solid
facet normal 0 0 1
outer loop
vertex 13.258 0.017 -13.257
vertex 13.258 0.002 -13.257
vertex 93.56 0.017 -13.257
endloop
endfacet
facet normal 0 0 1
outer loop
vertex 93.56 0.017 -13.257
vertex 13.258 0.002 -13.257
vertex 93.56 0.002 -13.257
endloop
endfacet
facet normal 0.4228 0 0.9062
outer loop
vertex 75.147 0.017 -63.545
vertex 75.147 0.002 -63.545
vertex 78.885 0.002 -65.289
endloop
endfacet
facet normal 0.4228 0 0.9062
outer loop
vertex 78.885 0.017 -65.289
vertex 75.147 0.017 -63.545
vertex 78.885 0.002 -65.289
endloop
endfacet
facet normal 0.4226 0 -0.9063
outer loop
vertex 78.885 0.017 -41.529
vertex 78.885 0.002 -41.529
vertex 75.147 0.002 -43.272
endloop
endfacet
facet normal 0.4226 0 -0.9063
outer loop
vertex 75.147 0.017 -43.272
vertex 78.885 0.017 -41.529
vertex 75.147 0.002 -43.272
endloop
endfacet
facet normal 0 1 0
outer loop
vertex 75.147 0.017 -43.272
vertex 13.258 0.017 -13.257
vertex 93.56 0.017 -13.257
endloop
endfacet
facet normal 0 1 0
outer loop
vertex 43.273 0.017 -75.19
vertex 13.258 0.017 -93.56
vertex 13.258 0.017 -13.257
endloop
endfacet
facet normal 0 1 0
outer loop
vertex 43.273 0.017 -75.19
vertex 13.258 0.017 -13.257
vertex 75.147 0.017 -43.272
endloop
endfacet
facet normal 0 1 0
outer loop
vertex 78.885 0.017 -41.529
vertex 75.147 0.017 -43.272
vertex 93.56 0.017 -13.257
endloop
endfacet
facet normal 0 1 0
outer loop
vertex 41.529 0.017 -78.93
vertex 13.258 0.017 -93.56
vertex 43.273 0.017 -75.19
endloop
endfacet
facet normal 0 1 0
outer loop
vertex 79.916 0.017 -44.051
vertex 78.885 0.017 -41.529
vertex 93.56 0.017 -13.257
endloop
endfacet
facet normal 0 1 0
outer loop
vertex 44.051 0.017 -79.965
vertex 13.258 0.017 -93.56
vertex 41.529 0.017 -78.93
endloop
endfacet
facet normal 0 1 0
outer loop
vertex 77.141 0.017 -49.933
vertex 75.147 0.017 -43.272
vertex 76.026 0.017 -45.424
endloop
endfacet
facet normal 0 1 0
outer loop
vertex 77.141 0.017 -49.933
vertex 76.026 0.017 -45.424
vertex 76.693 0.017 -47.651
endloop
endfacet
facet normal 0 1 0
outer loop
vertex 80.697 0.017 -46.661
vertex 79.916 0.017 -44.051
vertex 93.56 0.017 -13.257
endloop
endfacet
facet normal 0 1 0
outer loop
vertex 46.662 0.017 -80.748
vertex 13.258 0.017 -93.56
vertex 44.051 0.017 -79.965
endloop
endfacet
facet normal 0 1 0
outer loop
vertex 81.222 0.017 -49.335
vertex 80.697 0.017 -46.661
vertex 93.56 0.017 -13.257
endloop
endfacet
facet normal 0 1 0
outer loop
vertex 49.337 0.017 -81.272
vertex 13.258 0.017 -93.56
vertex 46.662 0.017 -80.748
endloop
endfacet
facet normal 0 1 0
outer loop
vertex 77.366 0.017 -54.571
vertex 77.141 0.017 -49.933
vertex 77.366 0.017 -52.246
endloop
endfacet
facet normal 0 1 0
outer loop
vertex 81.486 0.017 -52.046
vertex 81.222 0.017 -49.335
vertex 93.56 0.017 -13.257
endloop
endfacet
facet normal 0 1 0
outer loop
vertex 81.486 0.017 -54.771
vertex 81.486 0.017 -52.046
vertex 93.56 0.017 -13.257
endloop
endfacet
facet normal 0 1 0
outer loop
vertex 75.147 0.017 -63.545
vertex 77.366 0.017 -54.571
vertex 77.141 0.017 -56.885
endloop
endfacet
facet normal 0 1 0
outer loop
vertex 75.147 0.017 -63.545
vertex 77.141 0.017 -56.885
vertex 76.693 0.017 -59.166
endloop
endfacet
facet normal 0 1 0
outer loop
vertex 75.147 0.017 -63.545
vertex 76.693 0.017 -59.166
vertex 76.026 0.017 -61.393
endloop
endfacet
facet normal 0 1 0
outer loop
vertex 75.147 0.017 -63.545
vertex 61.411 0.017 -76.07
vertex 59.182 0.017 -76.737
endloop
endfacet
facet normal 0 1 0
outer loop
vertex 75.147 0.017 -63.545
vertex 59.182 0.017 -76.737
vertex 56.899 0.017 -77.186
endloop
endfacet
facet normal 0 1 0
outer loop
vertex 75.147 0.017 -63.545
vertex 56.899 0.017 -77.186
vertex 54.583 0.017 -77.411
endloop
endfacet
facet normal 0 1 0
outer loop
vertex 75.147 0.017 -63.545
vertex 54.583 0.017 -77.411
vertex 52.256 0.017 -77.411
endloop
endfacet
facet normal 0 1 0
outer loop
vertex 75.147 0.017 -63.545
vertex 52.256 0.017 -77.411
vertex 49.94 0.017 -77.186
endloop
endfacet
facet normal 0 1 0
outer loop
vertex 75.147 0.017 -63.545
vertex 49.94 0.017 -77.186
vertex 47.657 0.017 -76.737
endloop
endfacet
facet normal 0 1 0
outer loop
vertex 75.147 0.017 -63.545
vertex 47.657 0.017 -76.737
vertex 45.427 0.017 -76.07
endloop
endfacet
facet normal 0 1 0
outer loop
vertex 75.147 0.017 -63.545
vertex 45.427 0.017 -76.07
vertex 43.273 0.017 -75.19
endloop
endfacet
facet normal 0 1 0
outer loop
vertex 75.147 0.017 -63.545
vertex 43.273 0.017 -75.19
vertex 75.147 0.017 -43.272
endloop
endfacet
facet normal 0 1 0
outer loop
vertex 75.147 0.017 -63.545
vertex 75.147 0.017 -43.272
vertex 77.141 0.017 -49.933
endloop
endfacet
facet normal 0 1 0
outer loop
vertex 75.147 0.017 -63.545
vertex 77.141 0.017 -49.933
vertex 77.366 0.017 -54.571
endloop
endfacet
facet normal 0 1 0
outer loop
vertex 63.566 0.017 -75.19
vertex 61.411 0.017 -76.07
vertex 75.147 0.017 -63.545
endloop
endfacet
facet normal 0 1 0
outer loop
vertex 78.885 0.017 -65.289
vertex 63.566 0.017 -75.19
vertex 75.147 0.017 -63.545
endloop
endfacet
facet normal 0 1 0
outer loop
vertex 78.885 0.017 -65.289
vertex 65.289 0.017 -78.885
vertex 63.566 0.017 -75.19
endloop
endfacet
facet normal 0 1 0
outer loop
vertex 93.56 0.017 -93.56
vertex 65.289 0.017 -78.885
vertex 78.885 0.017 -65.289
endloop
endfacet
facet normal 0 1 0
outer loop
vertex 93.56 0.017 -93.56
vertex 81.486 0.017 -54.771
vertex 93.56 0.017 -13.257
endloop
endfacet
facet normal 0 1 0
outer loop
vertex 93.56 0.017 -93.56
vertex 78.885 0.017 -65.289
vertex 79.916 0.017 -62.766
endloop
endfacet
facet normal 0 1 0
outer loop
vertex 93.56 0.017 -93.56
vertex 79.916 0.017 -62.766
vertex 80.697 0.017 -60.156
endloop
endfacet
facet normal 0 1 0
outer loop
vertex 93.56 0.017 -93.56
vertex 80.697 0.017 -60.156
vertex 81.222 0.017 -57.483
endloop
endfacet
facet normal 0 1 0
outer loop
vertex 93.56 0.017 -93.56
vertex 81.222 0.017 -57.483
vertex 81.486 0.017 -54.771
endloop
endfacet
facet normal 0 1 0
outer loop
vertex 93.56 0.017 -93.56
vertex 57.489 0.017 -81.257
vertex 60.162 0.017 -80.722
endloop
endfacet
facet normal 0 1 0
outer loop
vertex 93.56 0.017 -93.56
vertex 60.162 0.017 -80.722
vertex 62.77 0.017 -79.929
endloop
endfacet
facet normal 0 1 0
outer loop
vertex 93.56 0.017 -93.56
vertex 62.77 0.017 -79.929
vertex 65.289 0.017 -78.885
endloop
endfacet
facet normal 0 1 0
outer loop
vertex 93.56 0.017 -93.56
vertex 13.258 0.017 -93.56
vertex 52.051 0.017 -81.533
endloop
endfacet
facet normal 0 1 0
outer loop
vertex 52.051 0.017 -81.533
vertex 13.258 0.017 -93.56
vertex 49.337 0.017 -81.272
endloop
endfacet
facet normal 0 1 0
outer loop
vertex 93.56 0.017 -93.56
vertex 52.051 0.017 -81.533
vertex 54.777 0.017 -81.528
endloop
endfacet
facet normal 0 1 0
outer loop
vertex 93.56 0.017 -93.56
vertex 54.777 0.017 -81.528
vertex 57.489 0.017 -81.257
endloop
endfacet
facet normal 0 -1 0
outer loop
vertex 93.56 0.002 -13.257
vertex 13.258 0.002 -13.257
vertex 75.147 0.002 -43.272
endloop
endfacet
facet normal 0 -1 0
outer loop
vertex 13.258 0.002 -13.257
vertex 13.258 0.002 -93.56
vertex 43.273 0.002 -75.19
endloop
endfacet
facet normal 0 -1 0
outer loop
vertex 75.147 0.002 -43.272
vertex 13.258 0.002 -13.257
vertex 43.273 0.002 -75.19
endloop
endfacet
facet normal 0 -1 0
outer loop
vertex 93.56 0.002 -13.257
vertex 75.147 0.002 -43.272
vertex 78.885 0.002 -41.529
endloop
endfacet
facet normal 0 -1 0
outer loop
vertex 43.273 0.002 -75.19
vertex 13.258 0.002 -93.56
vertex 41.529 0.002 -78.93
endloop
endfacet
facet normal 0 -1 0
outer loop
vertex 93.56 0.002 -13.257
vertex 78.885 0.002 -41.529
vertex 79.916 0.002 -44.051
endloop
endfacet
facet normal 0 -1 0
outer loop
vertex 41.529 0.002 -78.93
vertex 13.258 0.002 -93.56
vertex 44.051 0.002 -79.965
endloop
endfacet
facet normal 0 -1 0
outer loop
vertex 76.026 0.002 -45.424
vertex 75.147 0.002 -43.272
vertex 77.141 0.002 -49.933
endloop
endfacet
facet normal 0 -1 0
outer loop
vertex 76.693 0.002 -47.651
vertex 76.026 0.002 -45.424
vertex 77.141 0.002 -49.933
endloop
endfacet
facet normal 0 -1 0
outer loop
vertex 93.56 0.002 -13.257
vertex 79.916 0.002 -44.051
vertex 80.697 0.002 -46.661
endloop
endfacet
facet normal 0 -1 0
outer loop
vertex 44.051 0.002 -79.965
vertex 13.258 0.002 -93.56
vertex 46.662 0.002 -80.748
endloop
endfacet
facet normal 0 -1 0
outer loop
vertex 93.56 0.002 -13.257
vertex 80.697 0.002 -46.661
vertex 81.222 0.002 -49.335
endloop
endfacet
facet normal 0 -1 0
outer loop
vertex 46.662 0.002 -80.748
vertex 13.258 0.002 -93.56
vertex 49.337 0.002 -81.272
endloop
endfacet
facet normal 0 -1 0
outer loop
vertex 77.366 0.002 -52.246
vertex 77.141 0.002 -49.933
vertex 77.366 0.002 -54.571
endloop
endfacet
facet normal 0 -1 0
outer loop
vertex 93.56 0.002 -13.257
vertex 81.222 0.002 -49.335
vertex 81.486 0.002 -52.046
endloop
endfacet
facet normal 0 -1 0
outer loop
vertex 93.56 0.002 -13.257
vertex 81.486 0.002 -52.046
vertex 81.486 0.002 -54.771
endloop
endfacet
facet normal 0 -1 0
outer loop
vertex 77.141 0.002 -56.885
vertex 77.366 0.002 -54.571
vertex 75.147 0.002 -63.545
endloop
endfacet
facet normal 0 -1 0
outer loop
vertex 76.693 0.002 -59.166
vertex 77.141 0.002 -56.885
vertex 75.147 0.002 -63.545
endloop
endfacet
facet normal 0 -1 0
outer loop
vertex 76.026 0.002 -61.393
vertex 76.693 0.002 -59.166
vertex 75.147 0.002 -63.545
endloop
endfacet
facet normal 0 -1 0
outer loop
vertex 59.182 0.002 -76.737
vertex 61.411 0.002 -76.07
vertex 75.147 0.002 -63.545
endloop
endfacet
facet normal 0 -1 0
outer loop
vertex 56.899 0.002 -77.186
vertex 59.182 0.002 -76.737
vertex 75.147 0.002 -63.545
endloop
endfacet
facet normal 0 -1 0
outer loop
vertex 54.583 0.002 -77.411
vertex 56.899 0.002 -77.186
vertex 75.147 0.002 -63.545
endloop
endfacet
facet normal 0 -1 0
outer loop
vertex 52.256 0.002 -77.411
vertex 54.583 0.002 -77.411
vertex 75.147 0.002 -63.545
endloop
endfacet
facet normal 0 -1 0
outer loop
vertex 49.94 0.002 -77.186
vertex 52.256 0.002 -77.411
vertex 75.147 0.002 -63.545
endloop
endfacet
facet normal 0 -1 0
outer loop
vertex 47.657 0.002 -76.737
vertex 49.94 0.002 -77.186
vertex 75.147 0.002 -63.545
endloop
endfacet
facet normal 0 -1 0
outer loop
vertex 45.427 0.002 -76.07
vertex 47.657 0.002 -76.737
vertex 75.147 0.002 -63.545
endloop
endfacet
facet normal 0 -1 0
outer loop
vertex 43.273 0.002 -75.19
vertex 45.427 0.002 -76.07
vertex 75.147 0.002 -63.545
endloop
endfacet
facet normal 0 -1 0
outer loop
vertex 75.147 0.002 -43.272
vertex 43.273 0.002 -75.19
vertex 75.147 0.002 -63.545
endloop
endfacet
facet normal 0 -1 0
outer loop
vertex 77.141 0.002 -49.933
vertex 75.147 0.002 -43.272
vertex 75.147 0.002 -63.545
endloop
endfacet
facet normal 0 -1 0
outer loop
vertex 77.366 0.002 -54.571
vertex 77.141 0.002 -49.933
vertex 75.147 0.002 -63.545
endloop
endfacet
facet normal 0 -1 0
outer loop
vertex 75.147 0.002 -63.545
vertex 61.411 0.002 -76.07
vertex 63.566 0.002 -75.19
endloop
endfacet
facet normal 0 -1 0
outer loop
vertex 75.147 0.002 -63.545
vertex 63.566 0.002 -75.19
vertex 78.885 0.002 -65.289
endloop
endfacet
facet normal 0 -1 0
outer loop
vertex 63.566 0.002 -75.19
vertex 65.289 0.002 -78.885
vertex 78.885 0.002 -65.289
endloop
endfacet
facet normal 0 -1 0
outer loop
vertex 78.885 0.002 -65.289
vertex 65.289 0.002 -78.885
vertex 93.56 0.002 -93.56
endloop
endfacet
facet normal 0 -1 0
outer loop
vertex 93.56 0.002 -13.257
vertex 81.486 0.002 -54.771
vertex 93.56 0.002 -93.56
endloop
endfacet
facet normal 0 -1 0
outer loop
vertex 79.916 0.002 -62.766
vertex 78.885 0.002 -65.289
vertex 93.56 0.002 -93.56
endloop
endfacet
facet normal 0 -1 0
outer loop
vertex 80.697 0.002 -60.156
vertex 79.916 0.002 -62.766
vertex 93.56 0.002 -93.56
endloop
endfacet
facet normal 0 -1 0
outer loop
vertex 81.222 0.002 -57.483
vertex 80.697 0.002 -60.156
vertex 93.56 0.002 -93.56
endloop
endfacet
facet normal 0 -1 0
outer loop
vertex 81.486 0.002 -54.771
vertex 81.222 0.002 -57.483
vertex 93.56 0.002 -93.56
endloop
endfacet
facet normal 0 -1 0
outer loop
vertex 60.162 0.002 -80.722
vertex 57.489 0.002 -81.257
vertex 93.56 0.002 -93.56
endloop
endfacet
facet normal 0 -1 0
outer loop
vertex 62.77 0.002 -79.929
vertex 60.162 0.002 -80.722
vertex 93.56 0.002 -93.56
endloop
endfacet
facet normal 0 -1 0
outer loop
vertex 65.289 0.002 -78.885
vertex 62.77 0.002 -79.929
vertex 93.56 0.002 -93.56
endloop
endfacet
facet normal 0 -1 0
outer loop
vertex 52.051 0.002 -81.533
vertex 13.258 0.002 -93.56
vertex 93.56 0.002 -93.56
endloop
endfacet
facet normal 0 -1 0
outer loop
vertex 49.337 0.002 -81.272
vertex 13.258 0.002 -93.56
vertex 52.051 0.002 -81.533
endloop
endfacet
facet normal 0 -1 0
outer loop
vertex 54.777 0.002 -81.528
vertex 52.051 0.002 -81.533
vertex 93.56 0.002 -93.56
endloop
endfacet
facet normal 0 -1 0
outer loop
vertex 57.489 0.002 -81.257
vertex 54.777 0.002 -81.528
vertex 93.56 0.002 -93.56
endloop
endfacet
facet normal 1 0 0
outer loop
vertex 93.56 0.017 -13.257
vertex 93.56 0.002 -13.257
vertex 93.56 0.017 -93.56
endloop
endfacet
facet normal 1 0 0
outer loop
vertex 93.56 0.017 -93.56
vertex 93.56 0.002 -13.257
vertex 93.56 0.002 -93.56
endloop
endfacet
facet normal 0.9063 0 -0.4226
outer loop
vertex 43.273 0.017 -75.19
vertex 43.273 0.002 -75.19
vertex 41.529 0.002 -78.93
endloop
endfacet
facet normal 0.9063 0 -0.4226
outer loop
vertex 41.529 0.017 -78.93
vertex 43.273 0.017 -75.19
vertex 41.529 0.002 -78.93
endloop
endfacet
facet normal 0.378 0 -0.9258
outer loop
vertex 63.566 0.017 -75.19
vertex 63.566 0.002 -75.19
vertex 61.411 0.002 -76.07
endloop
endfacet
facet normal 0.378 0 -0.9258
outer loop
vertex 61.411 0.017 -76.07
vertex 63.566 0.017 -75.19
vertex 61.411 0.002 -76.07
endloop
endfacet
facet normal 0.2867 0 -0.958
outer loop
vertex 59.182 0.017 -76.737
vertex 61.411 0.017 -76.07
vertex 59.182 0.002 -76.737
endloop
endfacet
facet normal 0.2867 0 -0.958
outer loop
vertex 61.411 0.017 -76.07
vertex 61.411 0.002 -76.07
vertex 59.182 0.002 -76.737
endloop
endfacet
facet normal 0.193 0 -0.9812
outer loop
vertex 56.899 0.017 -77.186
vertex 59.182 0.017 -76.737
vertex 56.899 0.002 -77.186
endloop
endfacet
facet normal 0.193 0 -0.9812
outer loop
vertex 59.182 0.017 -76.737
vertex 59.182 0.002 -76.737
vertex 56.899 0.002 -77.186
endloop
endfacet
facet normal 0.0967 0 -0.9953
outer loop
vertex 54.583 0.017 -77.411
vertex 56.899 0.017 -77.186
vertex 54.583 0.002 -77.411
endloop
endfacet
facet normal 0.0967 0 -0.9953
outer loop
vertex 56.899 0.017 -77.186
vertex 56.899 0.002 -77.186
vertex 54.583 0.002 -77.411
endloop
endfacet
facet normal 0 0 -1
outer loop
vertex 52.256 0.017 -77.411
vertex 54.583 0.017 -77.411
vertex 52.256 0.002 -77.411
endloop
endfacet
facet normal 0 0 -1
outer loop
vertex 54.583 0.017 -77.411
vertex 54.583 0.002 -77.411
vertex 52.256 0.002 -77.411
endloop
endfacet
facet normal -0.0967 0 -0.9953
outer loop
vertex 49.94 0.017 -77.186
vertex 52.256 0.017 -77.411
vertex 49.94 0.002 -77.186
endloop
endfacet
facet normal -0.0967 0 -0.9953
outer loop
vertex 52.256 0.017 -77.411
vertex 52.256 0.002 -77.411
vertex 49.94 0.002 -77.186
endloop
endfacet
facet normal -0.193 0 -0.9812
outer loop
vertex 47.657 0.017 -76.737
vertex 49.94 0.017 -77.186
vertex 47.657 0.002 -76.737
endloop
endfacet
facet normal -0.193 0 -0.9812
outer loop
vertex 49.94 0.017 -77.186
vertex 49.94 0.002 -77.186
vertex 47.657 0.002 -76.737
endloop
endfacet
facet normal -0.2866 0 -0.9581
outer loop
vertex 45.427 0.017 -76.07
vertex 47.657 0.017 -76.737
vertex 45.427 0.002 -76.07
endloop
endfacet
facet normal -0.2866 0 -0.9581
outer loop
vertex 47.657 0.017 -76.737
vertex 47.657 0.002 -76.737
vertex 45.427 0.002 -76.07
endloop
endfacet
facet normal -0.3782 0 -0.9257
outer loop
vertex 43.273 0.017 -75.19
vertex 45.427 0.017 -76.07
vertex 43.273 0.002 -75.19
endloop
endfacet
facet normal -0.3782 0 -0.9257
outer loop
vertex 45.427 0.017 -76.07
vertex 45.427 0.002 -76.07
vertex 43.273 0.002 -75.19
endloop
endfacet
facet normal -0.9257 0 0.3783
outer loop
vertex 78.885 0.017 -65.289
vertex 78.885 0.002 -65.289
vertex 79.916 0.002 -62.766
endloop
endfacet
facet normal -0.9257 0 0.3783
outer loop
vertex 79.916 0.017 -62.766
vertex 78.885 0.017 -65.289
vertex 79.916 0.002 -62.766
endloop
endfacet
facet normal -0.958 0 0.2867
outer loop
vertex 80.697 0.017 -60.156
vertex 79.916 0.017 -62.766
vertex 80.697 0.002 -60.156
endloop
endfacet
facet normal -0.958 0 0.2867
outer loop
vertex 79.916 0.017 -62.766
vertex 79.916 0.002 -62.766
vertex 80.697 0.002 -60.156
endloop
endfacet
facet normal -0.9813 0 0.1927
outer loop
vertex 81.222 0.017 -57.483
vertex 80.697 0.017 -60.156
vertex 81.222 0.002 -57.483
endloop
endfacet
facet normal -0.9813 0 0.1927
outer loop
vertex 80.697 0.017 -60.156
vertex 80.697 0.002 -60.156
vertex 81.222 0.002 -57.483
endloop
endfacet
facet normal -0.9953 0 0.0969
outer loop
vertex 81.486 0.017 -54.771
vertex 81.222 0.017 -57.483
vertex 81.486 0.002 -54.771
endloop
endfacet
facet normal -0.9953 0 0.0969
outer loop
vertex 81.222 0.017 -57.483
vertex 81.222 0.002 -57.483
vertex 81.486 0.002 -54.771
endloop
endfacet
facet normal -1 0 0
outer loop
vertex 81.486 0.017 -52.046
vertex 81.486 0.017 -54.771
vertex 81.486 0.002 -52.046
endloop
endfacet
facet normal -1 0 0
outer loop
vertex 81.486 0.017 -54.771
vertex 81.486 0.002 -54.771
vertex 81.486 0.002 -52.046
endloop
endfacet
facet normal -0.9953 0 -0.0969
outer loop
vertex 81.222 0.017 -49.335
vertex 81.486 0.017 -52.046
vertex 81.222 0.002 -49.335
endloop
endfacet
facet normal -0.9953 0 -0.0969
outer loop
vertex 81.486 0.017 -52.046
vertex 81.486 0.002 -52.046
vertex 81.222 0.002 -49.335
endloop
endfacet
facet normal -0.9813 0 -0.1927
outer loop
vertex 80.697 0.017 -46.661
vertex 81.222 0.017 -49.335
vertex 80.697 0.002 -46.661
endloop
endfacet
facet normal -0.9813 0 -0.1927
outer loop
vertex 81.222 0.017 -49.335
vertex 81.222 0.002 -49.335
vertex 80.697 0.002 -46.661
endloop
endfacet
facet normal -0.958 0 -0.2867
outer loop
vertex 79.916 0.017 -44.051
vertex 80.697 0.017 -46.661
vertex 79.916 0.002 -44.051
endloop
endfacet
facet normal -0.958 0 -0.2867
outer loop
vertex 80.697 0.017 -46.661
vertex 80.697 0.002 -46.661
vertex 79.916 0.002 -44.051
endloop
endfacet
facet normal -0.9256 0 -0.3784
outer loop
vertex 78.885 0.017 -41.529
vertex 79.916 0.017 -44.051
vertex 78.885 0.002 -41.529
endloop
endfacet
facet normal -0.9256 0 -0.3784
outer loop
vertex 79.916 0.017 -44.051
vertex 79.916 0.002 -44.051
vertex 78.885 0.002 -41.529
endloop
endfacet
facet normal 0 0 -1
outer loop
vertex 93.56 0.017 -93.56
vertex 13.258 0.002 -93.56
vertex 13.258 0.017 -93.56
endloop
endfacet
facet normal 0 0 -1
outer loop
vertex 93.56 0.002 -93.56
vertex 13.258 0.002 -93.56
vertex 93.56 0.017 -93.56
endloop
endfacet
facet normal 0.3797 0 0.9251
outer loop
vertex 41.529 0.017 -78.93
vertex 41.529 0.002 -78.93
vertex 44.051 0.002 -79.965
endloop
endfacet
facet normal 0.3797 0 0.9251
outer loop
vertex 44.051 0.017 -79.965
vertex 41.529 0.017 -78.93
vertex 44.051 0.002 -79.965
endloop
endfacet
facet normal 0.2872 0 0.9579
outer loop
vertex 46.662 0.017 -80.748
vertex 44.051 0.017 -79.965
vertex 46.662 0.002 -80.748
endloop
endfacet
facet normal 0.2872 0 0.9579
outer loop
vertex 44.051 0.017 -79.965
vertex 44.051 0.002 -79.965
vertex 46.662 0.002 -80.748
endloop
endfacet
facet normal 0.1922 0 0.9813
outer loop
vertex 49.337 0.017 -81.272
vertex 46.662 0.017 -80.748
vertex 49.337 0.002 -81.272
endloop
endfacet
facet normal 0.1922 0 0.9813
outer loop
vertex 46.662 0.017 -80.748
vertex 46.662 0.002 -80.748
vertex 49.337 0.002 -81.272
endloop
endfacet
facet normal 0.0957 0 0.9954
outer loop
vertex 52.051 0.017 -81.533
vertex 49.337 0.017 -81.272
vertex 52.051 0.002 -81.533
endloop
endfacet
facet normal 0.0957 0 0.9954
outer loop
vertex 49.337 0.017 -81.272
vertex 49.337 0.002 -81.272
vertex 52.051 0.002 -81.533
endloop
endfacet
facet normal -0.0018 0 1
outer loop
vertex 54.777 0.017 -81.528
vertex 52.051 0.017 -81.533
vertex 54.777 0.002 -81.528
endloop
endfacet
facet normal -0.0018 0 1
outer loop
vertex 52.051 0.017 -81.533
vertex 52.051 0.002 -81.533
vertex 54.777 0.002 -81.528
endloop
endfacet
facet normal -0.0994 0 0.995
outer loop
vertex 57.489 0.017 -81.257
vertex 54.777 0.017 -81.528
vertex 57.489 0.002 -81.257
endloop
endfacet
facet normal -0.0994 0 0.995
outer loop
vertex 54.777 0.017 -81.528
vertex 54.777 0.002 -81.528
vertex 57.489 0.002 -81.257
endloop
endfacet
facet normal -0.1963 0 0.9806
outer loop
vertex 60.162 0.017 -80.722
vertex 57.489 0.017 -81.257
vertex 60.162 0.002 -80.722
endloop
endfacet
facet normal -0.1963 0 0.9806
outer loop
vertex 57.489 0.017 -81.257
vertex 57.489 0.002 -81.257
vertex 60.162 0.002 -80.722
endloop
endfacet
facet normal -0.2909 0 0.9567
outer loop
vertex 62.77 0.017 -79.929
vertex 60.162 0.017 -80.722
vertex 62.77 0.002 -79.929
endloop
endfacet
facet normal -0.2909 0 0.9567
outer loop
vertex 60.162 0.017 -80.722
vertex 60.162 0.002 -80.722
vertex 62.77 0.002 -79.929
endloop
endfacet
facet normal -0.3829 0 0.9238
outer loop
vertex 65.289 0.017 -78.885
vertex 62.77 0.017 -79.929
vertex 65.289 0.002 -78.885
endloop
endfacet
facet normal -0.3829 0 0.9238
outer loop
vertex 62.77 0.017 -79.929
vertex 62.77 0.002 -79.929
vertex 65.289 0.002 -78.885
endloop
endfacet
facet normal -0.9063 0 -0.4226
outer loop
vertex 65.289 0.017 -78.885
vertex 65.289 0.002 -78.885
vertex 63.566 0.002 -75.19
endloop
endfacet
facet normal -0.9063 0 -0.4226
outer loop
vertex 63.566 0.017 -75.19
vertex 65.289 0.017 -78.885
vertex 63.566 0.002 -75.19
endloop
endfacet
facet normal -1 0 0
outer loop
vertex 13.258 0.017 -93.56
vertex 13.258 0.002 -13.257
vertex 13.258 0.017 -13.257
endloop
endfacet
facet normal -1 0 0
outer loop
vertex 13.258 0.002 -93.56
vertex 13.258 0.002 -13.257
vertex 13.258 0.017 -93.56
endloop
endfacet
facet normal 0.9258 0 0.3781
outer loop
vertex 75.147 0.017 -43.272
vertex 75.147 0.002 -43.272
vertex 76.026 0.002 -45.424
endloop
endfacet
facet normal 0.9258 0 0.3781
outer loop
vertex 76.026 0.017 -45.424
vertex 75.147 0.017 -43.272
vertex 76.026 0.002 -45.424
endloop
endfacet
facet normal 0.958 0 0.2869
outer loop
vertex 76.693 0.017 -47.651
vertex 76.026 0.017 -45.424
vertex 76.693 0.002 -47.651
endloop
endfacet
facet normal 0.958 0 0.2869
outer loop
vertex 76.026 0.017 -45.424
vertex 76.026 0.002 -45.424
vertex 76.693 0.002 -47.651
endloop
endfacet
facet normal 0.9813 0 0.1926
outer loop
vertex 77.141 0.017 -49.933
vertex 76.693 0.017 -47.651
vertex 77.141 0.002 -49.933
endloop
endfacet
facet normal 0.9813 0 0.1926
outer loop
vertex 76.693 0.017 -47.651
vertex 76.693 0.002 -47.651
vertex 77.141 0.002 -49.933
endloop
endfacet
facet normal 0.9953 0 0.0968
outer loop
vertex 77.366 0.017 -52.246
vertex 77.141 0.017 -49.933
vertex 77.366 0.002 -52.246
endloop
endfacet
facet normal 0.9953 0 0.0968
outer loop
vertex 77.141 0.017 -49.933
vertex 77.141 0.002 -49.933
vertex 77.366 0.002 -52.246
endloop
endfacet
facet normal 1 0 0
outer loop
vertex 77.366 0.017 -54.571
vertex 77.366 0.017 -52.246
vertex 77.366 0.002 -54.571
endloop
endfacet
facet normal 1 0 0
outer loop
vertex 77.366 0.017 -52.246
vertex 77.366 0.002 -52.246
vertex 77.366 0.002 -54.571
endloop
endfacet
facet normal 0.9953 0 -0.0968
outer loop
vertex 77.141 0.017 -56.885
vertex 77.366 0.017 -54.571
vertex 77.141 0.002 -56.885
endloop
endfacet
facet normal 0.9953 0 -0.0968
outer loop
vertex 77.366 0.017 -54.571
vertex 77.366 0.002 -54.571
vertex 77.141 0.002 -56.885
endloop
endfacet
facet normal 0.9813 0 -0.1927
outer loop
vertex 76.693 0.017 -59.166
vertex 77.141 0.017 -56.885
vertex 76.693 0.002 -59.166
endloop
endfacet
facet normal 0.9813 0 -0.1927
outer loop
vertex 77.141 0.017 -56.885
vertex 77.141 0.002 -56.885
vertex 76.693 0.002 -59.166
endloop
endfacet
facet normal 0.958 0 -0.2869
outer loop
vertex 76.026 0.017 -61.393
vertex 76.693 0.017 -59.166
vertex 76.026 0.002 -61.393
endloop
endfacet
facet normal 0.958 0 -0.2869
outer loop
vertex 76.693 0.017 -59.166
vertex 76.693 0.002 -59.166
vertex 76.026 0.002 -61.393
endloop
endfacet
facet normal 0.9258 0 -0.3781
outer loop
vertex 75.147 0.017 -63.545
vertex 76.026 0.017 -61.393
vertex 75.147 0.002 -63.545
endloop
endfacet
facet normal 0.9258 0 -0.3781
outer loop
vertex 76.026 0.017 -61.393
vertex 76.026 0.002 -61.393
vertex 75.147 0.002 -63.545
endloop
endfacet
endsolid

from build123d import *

# Parameters (mm, degrees)
SKETCH1_W           = 107.07
SKETCH1_H           = 107.07
BOSS_EXTRUDE1_DEPTH = 0.02
SCALE2_SCALE        = 0.75


with BuildPart() as part:
    # Sketch1 → Boss-Extrude1 (new body)
    with BuildSketch(Plane(origin=(0, 0, 0), x_dir=(1, 0, 0), z_dir=(0, 1, 0))):
        with Locations((53.535, 53.535)):
            Rectangle(SKETCH1_W, SKETCH1_H)
        with BuildLine():
            Line((40.02098899, 82.576362505), (37.69526755, 87.563888229))
            ThreePointArc((37.69526755, 87.563888229), (53.541760789, 91.075404612), (69.37473245, 87.503415858))
            Line((69.37473245, 87.503415858), (67.077209739, 82.576362505))
            ThreePointArc((67.077209739, 82.576362505), (53.549099365, 85.57547237), (40.02098899, 82.576362505))
        make_face(mode=Mode.SUBTRACT)
        with BuildLine():
            Line((82.518723029, 67.05033201), (87.503415858, 69.37473245))
            ThreePointArc((87.503415858, 69.37473245), (91.015, 53.535), (87.503415858, 37.69526755))
            Line((87.503415858, 37.69526755), (82.518723029, 40.01966799))
            ThreePointArc((82.518723029, 40.01966799), (85.515, 53.535), (82.518723029, 67.05033201))
        make_face(mode=Mode.SUBTRACT)
    extrude(amount=BOSS_EXTRUDE1_DEPTH)


with BuildPart() as part_1:
    # Scale2: scaled about (53.030506877, 0.01, -53.029916686)
    add(part.part.scale(SCALE2_SCALE).moved(Location((13.257626719, 0.0025, -13.257479171))))


solid = part_1.part
